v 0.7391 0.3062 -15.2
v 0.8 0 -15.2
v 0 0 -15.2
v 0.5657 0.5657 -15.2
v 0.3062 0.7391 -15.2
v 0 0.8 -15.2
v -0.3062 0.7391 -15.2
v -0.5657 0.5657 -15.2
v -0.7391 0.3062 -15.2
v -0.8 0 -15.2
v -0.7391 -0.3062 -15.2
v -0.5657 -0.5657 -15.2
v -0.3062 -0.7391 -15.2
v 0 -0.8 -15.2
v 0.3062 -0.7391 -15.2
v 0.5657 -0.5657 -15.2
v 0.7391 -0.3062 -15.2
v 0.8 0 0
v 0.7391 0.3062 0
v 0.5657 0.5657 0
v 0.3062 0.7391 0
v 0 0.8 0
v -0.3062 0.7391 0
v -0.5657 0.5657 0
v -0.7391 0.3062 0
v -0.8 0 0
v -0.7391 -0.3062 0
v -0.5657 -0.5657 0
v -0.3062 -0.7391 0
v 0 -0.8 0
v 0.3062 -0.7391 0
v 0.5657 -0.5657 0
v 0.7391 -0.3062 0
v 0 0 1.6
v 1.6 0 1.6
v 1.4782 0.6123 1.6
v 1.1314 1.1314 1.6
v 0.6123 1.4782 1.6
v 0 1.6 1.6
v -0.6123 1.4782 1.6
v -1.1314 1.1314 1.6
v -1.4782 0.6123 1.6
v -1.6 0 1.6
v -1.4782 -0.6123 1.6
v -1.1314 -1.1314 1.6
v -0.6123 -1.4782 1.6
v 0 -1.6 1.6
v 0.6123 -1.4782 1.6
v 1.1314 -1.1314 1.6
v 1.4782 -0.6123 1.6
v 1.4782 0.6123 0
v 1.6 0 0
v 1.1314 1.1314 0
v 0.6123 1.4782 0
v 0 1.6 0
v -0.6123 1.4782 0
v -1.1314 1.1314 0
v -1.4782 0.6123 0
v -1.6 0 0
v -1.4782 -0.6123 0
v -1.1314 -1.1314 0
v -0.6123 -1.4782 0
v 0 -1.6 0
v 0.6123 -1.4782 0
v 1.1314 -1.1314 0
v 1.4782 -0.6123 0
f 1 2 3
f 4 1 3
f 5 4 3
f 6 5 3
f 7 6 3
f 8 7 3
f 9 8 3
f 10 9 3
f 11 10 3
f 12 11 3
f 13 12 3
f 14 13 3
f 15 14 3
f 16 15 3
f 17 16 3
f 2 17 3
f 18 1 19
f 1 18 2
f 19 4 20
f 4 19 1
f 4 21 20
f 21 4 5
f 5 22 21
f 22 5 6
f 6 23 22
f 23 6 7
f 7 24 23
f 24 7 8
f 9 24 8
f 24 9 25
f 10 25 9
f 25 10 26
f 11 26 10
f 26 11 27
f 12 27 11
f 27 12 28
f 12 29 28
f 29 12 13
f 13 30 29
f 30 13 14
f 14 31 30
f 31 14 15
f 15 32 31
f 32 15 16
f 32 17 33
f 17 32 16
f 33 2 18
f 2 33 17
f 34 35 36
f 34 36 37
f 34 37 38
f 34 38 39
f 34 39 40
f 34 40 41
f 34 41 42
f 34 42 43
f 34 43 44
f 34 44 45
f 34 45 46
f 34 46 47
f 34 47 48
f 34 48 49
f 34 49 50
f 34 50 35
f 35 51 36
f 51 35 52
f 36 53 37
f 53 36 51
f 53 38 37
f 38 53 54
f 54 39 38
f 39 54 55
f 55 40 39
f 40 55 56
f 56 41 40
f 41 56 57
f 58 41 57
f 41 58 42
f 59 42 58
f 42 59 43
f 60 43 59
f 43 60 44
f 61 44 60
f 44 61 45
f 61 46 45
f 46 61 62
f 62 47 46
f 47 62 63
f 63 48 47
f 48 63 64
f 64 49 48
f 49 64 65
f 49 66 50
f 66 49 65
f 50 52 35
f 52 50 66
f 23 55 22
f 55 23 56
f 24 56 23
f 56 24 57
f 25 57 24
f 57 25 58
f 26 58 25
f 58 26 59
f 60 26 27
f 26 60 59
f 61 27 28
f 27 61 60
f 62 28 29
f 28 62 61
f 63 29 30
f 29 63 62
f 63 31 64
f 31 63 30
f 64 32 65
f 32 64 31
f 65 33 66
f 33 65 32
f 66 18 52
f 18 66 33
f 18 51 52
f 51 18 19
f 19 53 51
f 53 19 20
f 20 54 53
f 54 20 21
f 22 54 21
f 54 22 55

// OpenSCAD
// file: ../p/4-4edge.scad
use <../lib.scad>
function ldraw_lib__4_4edge() = [
// 0 Circle 1.0
// 0 Name: 4-4edge.dat
// 0 Author: James Jessiman
// 0 !LDRAW_ORG Primitive UPDATE 2017-01
// 0 !LICENSE Licensed under CC BY 4.0 : see CAreadme.txt
// 
// 0 BFC CERTIFY CCW
  [0,"BFC","CERTIFY"],
  [0,"BFC","CCW"],
// 
// 0 !HISTORY 1998-12-15 [PTadmin] Official Update 1998-10
// 0 !HISTORY 2005-12-28 [PTadmin] Official Update 2005-01
// 0 !HISTORY 2007-06-24 [PTadmin] Header formatted for Contributor Agreement
// 0 !HISTORY 2008-07-01 [PTadmin] Official Update 2008-01
// 0 !HISTORY 2017-01-15 [Steffen] BFCed
// 0 !HISTORY 2017-12-30 [PTadmin] Official Update 2017-01
// 
// 
// 2 24 1 0 0 0.9239 0 0.3827
  [2,24,1,0,0,0.9239,0,0.3827],
// 2 24 0.9239 0 0.3827 0.7071 0 0.7071
  [2,24,0.9239,0,0.3827,0.7071,0,0.7071],
// 2 24 0.7071 0 0.7071 0.3827 0 0.9239
  [2,24,0.7071,0,0.7071,0.3827,0,0.9239],
// 2 24 0.3827 0 0.9239 0 0 1
  [2,24,0.3827,0,0.9239,0,0,1],
// 2 24 0 0 1 -0.3827 0 0.9239
  [2,24,0,0,1,-0.3827,0,0.9239],
// 2 24 -0.3827 0 0.9239 -0.7071 0 0.7071
  [2,24,-0.3827,0,0.9239,-0.7071,0,0.7071],
// 2 24 -0.7071 0 0.7071 -0.9239 0 0.3827
  [2,24,-0.7071,0,0.7071,-0.9239,0,0.3827],
// 2 24 -0.9239 0 0.3827 -1 0 -0
  [2,24,-0.9239,0,0.3827,-1,0,-0],
// 2 24 -1 0 -0 -0.9239 0 -0.3827
  [2,24,-1,0,-0,-0.9239,0,-0.3827],
// 2 24 -0.9239 0 -0.3827 -0.7071 0 -0.7071
  [2,24,-0.9239,0,-0.3827,-0.7071,0,-0.7071],
// 2 24 -0.7071 0 -0.7071 -0.3827 0 -0.9239
  [2,24,-0.7071,0,-0.7071,-0.3827,0,-0.9239],
// 2 24 -0.3827 0 -0.9239 0 0 -1
  [2,24,-0.3827,0,-0.9239,0,0,-1],
// 2 24 0 0 -1 0.3827 0 -0.9239
  [2,24,0,0,-1,0.3827,0,-0.9239],
// 2 24 0.3827 0 -0.9239 0.7071 0 -0.7071
  [2,24,0.3827,0,-0.9239,0.7071,0,-0.7071],
// 2 24 0.7071 0 -0.7071 0.9239 0 -0.3827
  [2,24,0.7071,0,-0.7071,0.9239,0,-0.3827],
// 2 24 0.9239 0 -0.3827 1 0 0
  [2,24,0.9239,0,-0.3827,1,0,0],
];
module ldraw_lib__4_4edge(step=0, col=false, unit=2/5, alt=false, line=0.2, solid=!$preview)
    makepoly(ldraw_lib__4_4edge(), step=step, col=col, unit=unit, alt=alt, line=line, solid=solid);
ldraw_lib__4_4edge(line=0.2);
// file: ../p/4-4disc.scad
use <../lib.scad>
function ldraw_lib__4_4disc() = [
// 0 Disc 1.0
// 0 Name: 4-4disc.dat
// 0 Author: James Jessiman
// 0 !LDRAW_ORG Primitive UPDATE 2002-02
// 0 !LICENSE Licensed under CC BY 4.0 : see CAreadme.txt
// 
// 0 BFC CERTIFY CCW
  [0,"BFC","CERTIFY"],
  [0,"BFC","CCW"],
// 
// 0 !HISTORY 1998-12-15 [PTadmin] Official Update 1998-10
// 0 !HISTORY 2002-03-23 [sbliss] Added BFC statement
// 0 !HISTORY 2002-04-25 [PTadmin] Official Update 2002-02
// 0 !HISTORY 2007-06-24 [PTadmin] Header formatted for Contributor Agreement
// 0 !HISTORY 2008-07-01 [PTadmin] Official Update 2008-01
// 
// 
// 3 16 0 0 0 1 0 0 0.9239 0 0.3827
  [3,16,0,0,0,1,0,0,0.9239,0,0.3827],
// 3 16 0 0 0 0.9239 0 0.3827 0.7071 0 0.7071
  [3,16,0,0,0,0.9239,0,0.3827,0.7071,0,0.7071],
// 3 16 0 0 0 0.7071 0 0.7071 0.3827 0 0.9239
  [3,16,0,0,0,0.7071,0,0.7071,0.3827,0,0.9239],
// 3 16 0 0 0 0.3827 0 0.9239 0 0 1
  [3,16,0,0,0,0.3827,0,0.9239,0,0,1],
// 3 16 0 0 0 0 0 1 -0.3827 0 0.9239
  [3,16,0,0,0,0,0,1,-0.3827,0,0.9239],
// 3 16 0 0 0 -0.3827 0 0.9239 -0.7071 0 0.7071
  [3,16,0,0,0,-0.3827,0,0.9239,-0.7071,0,0.7071],
// 3 16 0 0 0 -0.7071 0 0.7071 -0.9239 0 0.3827
  [3,16,0,0,0,-0.7071,0,0.7071,-0.9239,0,0.3827],
// 3 16 0 0 0 -0.9239 0 0.3827 -1 0 -0
  [3,16,0,0,0,-0.9239,0,0.3827,-1,0,-0],
// 3 16 0 0 0 -1 0 -0 -0.9239 0 -0.3827
  [3,16,0,0,0,-1,0,-0,-0.9239,0,-0.3827],
// 3 16 0 0 0 -0.9239 0 -0.3827 -0.7071 0 -0.7071
  [3,16,0,0,0,-0.9239,0,-0.3827,-0.7071,0,-0.7071],
// 3 16 0 0 0 -0.7071 0 -0.7071 -0.3827 0 -0.9239
  [3,16,0,0,0,-0.7071,0,-0.7071,-0.3827,0,-0.9239],
// 3 16 0 0 0 -0.3827 0 -0.9239 0 0 -1
  [3,16,0,0,0,-0.3827,0,-0.9239,0,0,-1],
// 3 16 0 0 0 0 0 -1 0.3827 0 -0.9239
  [3,16,0,0,0,0,0,-1,0.3827,0,-0.9239],
// 3 16 0 0 0 0.3827 0 -0.9239 0.7071 0 -0.7071
  [3,16,0,0,0,0.3827,0,-0.9239,0.7071,0,-0.7071],
// 3 16 0 0 0 0.7071 0 -0.7071 0.9239 0 -0.3827
  [3,16,0,0,0,0.7071,0,-0.7071,0.9239,0,-0.3827],
// 3 16 0 0 0 0.9239 0 -0.3827 1 0 0
  [3,16,0,0,0,0.9239,0,-0.3827,1,0,0],
// 0
];
module ldraw_lib__4_4disc(step=0, col=false, unit=2/5, alt=false, line=0.2, solid=!$preview)
    makepoly(ldraw_lib__4_4disc(), step=step, col=col, unit=unit, alt=alt, line=line, solid=solid);
ldraw_lib__4_4disc(line=0.2);
// file: ../p/4-4cyli.scad
use <../lib.scad>
function ldraw_lib__4_4cyli() = [
// 0 Cylinder 1.0
// 0 Name: 4-4cyli.dat
// 0 Author: James Jessiman
// 0 !LDRAW_ORG Primitive UPDATE 2005-01
// 0 !LICENSE Licensed under CC BY 2.0 and CC BY 4.0 : see CAreadme.txt
// 
// 0 BFC CERTIFY CCW
  [0,"BFC","CERTIFY"],
  [0,"BFC","CCW"],
// 
// 0 !HISTORY 1998-12-15 [PTadmin] Official Update 1998-10
// 0 !HISTORY 2002-03-23 [sbliss] Added BFC statement; merged headers from files in distributions LDraw 0.27 and Complete.
// 0 !HISTORY 2002-04-25 [PTadmin] Official Update 2002-02
// 0 !HISTORY 2004-12-14 [guyvivan] BFC CCW
// 0 !HISTORY 2005-12-28 [PTadmin] Official Update 2005-01
// 0 !HISTORY 2007-06-24 [PTadmin] Header formatted for Contributor Agreement
// 0 !HISTORY 2008-07-01 [PTadmin] Official Update 2008-01
// 
// 
// 4 16 1 1 0 0.9239 1 0.3827 0.9239 0 0.3827 1 0 0
  [4,16,1,1,0,0.9239,1,0.3827,0.9239,0,0.3827,1,0,0],
// 5 24 1 0 0 1 1 0 0.9239 0 0.3827 0.9239 0 -0.3827
  [5,24,1,0,0,1,1,0,0.9239,0,0.3827,0.9239,0,-0.3827],
// 4 16 0.9239 1 0.3827 0.7071 1 0.7071 0.7071 0 0.7071 0.9239 0 0.3827
  [4,16,0.9239,1,0.3827,0.7071,1,0.7071,0.7071,0,0.7071,0.9239,0,0.3827],
// 5 24 0.9239 0 0.3827 0.9239 1 0.3827 0.7071 0 0.7071 1 0 0
  [5,24,0.9239,0,0.3827,0.9239,1,0.3827,0.7071,0,0.7071,1,0,0],
// 4 16 0.7071 1 0.7071 0.3827 1 0.9239 0.3827 0 0.9239 0.7071 0 0.7071
  [4,16,0.7071,1,0.7071,0.3827,1,0.9239,0.3827,0,0.9239,0.7071,0,0.7071],
// 5 24 0.7071 0 0.7071 0.7071 1 0.7071 0.3827 0 0.9239 0.9239 0 0.3827
  [5,24,0.7071,0,0.7071,0.7071,1,0.7071,0.3827,0,0.9239,0.9239,0,0.3827],
// 4 16 0.3827 1 0.9239 0 1 1 0 0 1 0.3827 0 0.9239
  [4,16,0.3827,1,0.9239,0,1,1,0,0,1,0.3827,0,0.9239],
// 5 24 0.3827 0 0.9239 0.3827 1 0.9239 0 0 1 0.7071 0 0.7071
  [5,24,0.3827,0,0.9239,0.3827,1,0.9239,0,0,1,0.7071,0,0.7071],
// 4 16 0 1 1 -0.3827 1 0.9239 -0.3827 0 0.9239 0 0 1
  [4,16,0,1,1,-0.3827,1,0.9239,-0.3827,0,0.9239,0,0,1],
// 5 24 0 0 1 0 1 1 -0.3827 0 0.9239 0.3827 0 0.9239
  [5,24,0,0,1,0,1,1,-0.3827,0,0.9239,0.3827,0,0.9239],
// 4 16 -0.3827 1 0.9239 -0.7071 1 0.7071 -0.7071 0 0.7071 -0.3827 0 0.9239
  [4,16,-0.3827,1,0.9239,-0.7071,1,0.7071,-0.7071,0,0.7071,-0.3827,0,0.9239],
// 5 24 -0.3827 0 0.9239 -0.3827 1 0.9239 -0.7071 0 0.7071 0 0 1
  [5,24,-0.3827,0,0.9239,-0.3827,1,0.9239,-0.7071,0,0.7071,0,0,1],
// 4 16 -0.7071 1 0.7071 -0.9239 1 0.3827 -0.9239 0 0.3827 -0.7071 0 0.7071
  [4,16,-0.7071,1,0.7071,-0.9239,1,0.3827,-0.9239,0,0.3827,-0.7071,0,0.7071],
// 5 24 -0.7071 0 0.7071 -0.7071 1 0.7071 -0.9239 0 0.3827 -0.3827 0 0.9239
  [5,24,-0.7071,0,0.7071,-0.7071,1,0.7071,-0.9239,0,0.3827,-0.3827,0,0.9239],
// 4 16 -0.9239 1 0.3827 -1 1 0 -1 0 0 -0.9239 0 0.3827
  [4,16,-0.9239,1,0.3827,-1,1,0,-1,0,0,-0.9239,0,0.3827],
// 5 24 -0.9239 0 0.3827 -0.9239 1 0.3827 -1 0 0 -0.7071 0 0.7071
  [5,24,-0.9239,0,0.3827,-0.9239,1,0.3827,-1,0,0,-0.7071,0,0.7071],
// 4 16 -1 1 0 -0.9239 1 -0.3827 -0.9239 0 -0.3827 -1 0 0
  [4,16,-1,1,0,-0.9239,1,-0.3827,-0.9239,0,-0.3827,-1,0,0],
// 5 24 -1 0 0 -1 1 0 -0.9239 0 -0.3827 -0.9239 0 0.3827
  [5,24,-1,0,0,-1,1,0,-0.9239,0,-0.3827,-0.9239,0,0.3827],
// 4 16 -0.9239 1 -0.3827 -0.7071 1 -0.7071 -0.7071 0 -0.7071 -0.9239 0 -0.3827
  [4,16,-0.9239,1,-0.3827,-0.7071,1,-0.7071,-0.7071,0,-0.7071,-0.9239,0,-0.3827],
// 5 24 -0.9239 0 -0.3827 -0.9239 1 -0.3827 -0.7071 0 -0.7071 -1 0 0
  [5,24,-0.9239,0,-0.3827,-0.9239,1,-0.3827,-0.7071,0,-0.7071,-1,0,0],
// 4 16 -0.7071 1 -0.7071 -0.3827 1 -0.9239 -0.3827 0 -0.9239 -0.7071 0 -0.7071
  [4,16,-0.7071,1,-0.7071,-0.3827,1,-0.9239,-0.3827,0,-0.9239,-0.7071,0,-0.7071],
// 5 24 -0.7071 0 -0.7071 -0.7071 1 -0.7071 -0.3827 0 -0.9239 -0.9239 0 -0.3827
  [5,24,-0.7071,0,-0.7071,-0.7071,1,-0.7071,-0.3827,0,-0.9239,-0.9239,0,-0.3827],
// 4 16 -0.3827 1 -0.9239 0 1 -1 0 0 -1 -0.3827 0 -0.9239
  [4,16,-0.3827,1,-0.9239,0,1,-1,0,0,-1,-0.3827,0,-0.9239],
// 5 24 -0.3827 0 -0.9239 -0.3827 1 -0.9239 0 0 -1 -0.7071 0 -0.7071
  [5,24,-0.3827,0,-0.9239,-0.3827,1,-0.9239,0,0,-1,-0.7071,0,-0.7071],
// 4 16 0 1 -1 0.3827 1 -0.9239 0.3827 0 -0.9239 0 0 -1
  [4,16,0,1,-1,0.3827,1,-0.9239,0.3827,0,-0.9239,0,0,-1],
// 5 24 0 0 -1 0 1 -1 0.3827 0 -0.9239 -0.3827 0 -0.9239
  [5,24,0,0,-1,0,1,-1,0.3827,0,-0.9239,-0.3827,0,-0.9239],
// 4 16 0.3827 1 -0.9239 0.7071 1 -0.7071 0.7071 0 -0.7071 0.3827 0 -0.9239
  [4,16,0.3827,1,-0.9239,0.7071,1,-0.7071,0.7071,0,-0.7071,0.3827,0,-0.9239],
// 5 24 0.3827 0 -0.9239 0.3827 1 -0.9239 0.7071 0 -0.7071 0 0 -1
  [5,24,0.3827,0,-0.9239,0.3827,1,-0.9239,0.7071,0,-0.7071,0,0,-1],
// 4 16 0.7071 1 -0.7071 0.9239 1 -0.3827 0.9239 0 -0.3827 0.7071 0 -0.7071
  [4,16,0.7071,1,-0.7071,0.9239,1,-0.3827,0.9239,0,-0.3827,0.7071,0,-0.7071],
// 5 24 0.7071 0 -0.7071 0.7071 1 -0.7071 0.9239 0 -0.3827 0.3827 0 -0.9239
  [5,24,0.7071,0,-0.7071,0.7071,1,-0.7071,0.9239,0,-0.3827,0.3827,0,-0.9239],
// 4 16 0.9239 1 -0.3827 1 1 0 1 0 0 0.9239 0 -0.3827
  [4,16,0.9239,1,-0.3827,1,1,0,1,0,0,0.9239,0,-0.3827],
// 5 24 0.9239 0 -0.3827 0.9239 1 -0.3827 1 0 0 0.7071 0 -0.7071
  [5,24,0.9239,0,-0.3827,0.9239,1,-0.3827,1,0,0,0.7071,0,-0.7071],
// 0
];
module ldraw_lib__4_4cyli(step=0, col=false, unit=2/5, alt=false, line=0.2, solid=!$preview)
    makepoly(ldraw_lib__4_4cyli(), step=step, col=col, unit=unit, alt=alt, line=line, solid=solid);
ldraw_lib__4_4cyli(line=0.2);
// file: ../p/4-4ring1.scad
use <../lib.scad>
function ldraw_lib__4_4ring1() = [
// 0 Ring  1 x 1.0
// 0 Name: 4-4ring1.dat
// 0 Author: James Jessiman
// 0 !LDRAW_ORG Primitive UPDATE 2009-01
// 0 !LICENSE Licensed under CC BY 2.0 and CC BY 4.0 : see CAreadme.txt
// 
// 0 BFC CERTIFY CCW
  [0,"BFC","CERTIFY"],
  [0,"BFC","CCW"],
// 
// 0 !HISTORY 1998-12-15 [PTadmin] Official Update 1998-10
// 0 !HISTORY 2002-04-08 [BrickCaster] Modified for BFC compliance
// 0 !HISTORY 2002-04-25 [PTadmin] Official Update 2002-02
// 0 !HISTORY 2007-06-24 [PTadmin] Header formatted for Contributor Agreement
// 0 !HISTORY 2008-07-01 [PTadmin] Official Update 2008-01
// 0 !HISTORY 2008-08-26 [cwdee] Switch polygon winding and rename
// 0 !HISTORY 2009-05-02 [PTadmin] Official Update 2009-01
// 
// 
// 4 16 -0.7654 0 1.8478 -0.3827 0 0.9239 0 0 1 0 0 2
  [4,16,-0.7654,0,1.8478,-0.3827,0,0.9239,0,0,1,0,0,2],
// 4 16 -1.4142 0 1.4142 -0.7071 0 0.7071 -0.3827 0 0.9239 -0.7654 0 1.8478
  [4,16,-1.4142,0,1.4142,-0.7071,0,0.7071,-0.3827,0,0.9239,-0.7654,0,1.8478],
// 4 16 -1.8478 0 0.7654 -0.9239 0 0.3827 -0.7071 0 0.7071 -1.4142 0 1.41420
  [4,16,-1.8478,0,0.7654,-0.9239,0,0.3827,-0.7071,0,0.7071,-1.4142,0,1.41420],
// 4 16 -2 0 0 -1 0 0 -0.9239 0 0.3827 -1.8478 0 0.7654
  [4,16,-2,0,0,-1,0,0,-0.9239,0,0.3827,-1.8478,0,0.7654],
// 4 16 -1.8478 0 -0.7654 -0.9239 0 -0.3827 -1 0 0 -2 0 0
  [4,16,-1.8478,0,-0.7654,-0.9239,0,-0.3827,-1,0,0,-2,0,0],
// 4 16 -1.4142 0 -1.4142 -0.7071 0 -0.7071 -0.9239 0 -0.3827 -1.8478 0 -0.7654
  [4,16,-1.4142,0,-1.4142,-0.7071,0,-0.7071,-0.9239,0,-0.3827,-1.8478,0,-0.7654],
// 4 16 -0.7654 0 -1.8478 -0.3827 0 -0.9239 -0.7071 0 -0.7071 -1.4142 0 -1.4142
  [4,16,-0.7654,0,-1.8478,-0.3827,0,-0.9239,-0.7071,0,-0.7071,-1.4142,0,-1.4142],
// 4 16 0 0 -2 0 0 -1 -0.3827 0 -0.9239 -0.7654 0 -1.8478
  [4,16,0,0,-2,0,0,-1,-0.3827,0,-0.9239,-0.7654,0,-1.8478],
// 4 16 0.7654 0 -1.8478 0.3827 0 -0.9239 0 0 -1 0 0 -2
  [4,16,0.7654,0,-1.8478,0.3827,0,-0.9239,0,0,-1,0,0,-2],
// 4 16 1.4142 0 -1.4142 0.7071 0 -0.7071 0.3827 0 -0.9239 0.7654 0 -1.8478
  [4,16,1.4142,0,-1.4142,0.7071,0,-0.7071,0.3827,0,-0.9239,0.7654,0,-1.8478],
// 4 16 1.8478 0 -0.7654 0.9239 0 -0.3827 0.7071 0 -0.7071 1.4142 0 -1.4142
  [4,16,1.8478,0,-0.7654,0.9239,0,-0.3827,0.7071,0,-0.7071,1.4142,0,-1.4142],
// 4 16 2 0 0 1 0 0 0.9239 0 -0.3827 1.8478 0 -0.7654
  [4,16,2,0,0,1,0,0,0.9239,0,-0.3827,1.8478,0,-0.7654],
// 4 16 1.8478 0 0.7654 0.9239 0 0.3827 1 0 0 2 0 0
  [4,16,1.8478,0,0.7654,0.9239,0,0.3827,1,0,0,2,0,0],
// 4 16 1.4142 0 1.4142 0.7071 0 0.7071 0.9239 0 0.3827 1.8478 0 0.7654
  [4,16,1.4142,0,1.4142,0.7071,0,0.7071,0.9239,0,0.3827,1.8478,0,0.7654],
// 4 16 0.7654 0 1.8478 0.3827 0 0.9239 0.7071 0 0.7071 1.4142 0 1.4142
  [4,16,0.7654,0,1.8478,0.3827,0,0.9239,0.7071,0,0.7071,1.4142,0,1.4142],
// 4 16 0 0 2 0 0 1 0.3827 0 0.9239 0.7654 0 1.8478
  [4,16,0,0,2,0,0,1,0.3827,0,0.9239,0.7654,0,1.8478],
// 0
];
module ldraw_lib__4_4ring1(step=0, col=false, unit=2/5, alt=false, line=0.2, solid=!$preview)
    makepoly(ldraw_lib__4_4ring1(), step=step, col=col, unit=unit, alt=alt, line=line, solid=solid);
ldraw_lib__4_4ring1(line=0.2);
// file: ../p/4-4cylc.scad
use <../lib.scad>
use <4-4cyli.scad>
use <4-4disc.scad>
use <4-4edge.scad>
function ldraw_lib__4_4cylc() = [
// 0 Cylinder Closed 1.0
// 0 Name: 4-4cylc.dat
// 0 Author: Alex Taylor [anathema]
// 0 !LDRAW_ORG Primitive UPDATE 2009-02
// 0 !LICENSE Licensed under CC BY 2.0 and CC BY 4.0 : see CAreadme.txt
// 
// 0 BFC CERTIFY CCW
  [0,"BFC","CERTIFY"],
  [0,"BFC","CCW"],
// 
// 0 !HISTORY 2008-12-29 [cwdee] Removed one disc
// 0 !HISTORY 2009-09-03 [PTadmin] Official Update 2009-02
// 
// 
// 1 16 0 0 0 1 0 0 0 1 0 0 0 1 4-4edge.dat
  [1,16,0,0,0,1,0,0,0,1,0,0,0,1, ldraw_lib__4_4edge()],
// 1 16 0 1 0 1 0 0 0 1 0 0 0 1 4-4edge.dat
  [1,16,0,1,0,1,0,0,0,1,0,0,0,1, ldraw_lib__4_4edge()],
// 1 16 0 0 0 1 0 0 0 1 0 0 0 1 4-4disc.dat
  [1,16,0,0,0,1,0,0,0,1,0,0,0,1, ldraw_lib__4_4disc()],
// 1 16 0 0 0 1 0 0 0 1 0 0 0 1 4-4cyli.dat
  [1,16,0,0,0,1,0,0,0,1,0,0,0,1, ldraw_lib__4_4cyli()],
// 0
];
module ldraw_lib__4_4cylc(step=0, col=false, unit=2/5, alt=false, line=0.2, solid=!$preview)
    makepoly(ldraw_lib__4_4cylc(), step=step, col=col, unit=unit, alt=alt, line=line, solid=solid);
ldraw_lib__4_4cylc(line=0.2);
// main file
use <../lib.scad>
use <../p/4-4cylc.scad>
use <../p/4-4ring1.scad>
function ldraw_lib__u9473() = [
// 0 ~Electric Powered Up 6 Port Hub Rechargeable Battery Assembly Pin
// 0 Name: u9473.dat
// 0 Author: Philippe Hurbain [Philo]
// 0 !LDRAW_ORG Part UPDATE 2020-03
// 0 !LICENSE Licensed under CC BY 4.0 : see CAreadme.txt
// 
// 0 BFC CERTIFY CCW
  [0,"BFC","CERTIFY"],
  [0,"BFC","CCW"],
// 
// 0 !KEYWORDS Mindstorms, Robot Inventor, Spike Prime
// 
// 0 !HISTORY 2019-12-27 [PTadmin] Official Update 2019-03
// 0 !HISTORY 2020-02-24 [cwdee] Update description
// 0 !HISTORY 2020-06-28 [PTadmin] Official Update 2020-01
// 0 !HISTORY 2020-12-27 [PTadmin] Update description
// 0 !HISTORY 2020-12-29 [PTadmin] Official Update 2020-03
// 
// 
// 1 16 0 38 0 2 0 0 0 -38 0 0 0 2 4-4cylc.dat
  [1,16,0,38,0,2,0,0,0,-38,0,0,0,2, ldraw_lib__4_4cylc()],
// 1 16 0 -4 0 4 0 0 0 4 0 0 0 4 4-4cylc.dat
  [1,16,0,-4,0,4,0,0,0,4,0,0,0,4, ldraw_lib__4_4cylc()],
// 1 16 0 0 0 2 0 0 0 -1 0 0 0 2 4-4ring1.dat
  [1,16,0,0,0,2,0,0,0,-1,0,0,0,2, ldraw_lib__4_4ring1()],
];
module ldraw_lib__u9473(step=0, col=false, unit=2/5, alt=false, line=0.2, solid=!$preview)
    makepoly(ldraw_lib__u9473(), step=step, col=col, unit=unit, alt=alt, line=line, solid=solid);
ldraw_lib__u9473(line=0.2);
